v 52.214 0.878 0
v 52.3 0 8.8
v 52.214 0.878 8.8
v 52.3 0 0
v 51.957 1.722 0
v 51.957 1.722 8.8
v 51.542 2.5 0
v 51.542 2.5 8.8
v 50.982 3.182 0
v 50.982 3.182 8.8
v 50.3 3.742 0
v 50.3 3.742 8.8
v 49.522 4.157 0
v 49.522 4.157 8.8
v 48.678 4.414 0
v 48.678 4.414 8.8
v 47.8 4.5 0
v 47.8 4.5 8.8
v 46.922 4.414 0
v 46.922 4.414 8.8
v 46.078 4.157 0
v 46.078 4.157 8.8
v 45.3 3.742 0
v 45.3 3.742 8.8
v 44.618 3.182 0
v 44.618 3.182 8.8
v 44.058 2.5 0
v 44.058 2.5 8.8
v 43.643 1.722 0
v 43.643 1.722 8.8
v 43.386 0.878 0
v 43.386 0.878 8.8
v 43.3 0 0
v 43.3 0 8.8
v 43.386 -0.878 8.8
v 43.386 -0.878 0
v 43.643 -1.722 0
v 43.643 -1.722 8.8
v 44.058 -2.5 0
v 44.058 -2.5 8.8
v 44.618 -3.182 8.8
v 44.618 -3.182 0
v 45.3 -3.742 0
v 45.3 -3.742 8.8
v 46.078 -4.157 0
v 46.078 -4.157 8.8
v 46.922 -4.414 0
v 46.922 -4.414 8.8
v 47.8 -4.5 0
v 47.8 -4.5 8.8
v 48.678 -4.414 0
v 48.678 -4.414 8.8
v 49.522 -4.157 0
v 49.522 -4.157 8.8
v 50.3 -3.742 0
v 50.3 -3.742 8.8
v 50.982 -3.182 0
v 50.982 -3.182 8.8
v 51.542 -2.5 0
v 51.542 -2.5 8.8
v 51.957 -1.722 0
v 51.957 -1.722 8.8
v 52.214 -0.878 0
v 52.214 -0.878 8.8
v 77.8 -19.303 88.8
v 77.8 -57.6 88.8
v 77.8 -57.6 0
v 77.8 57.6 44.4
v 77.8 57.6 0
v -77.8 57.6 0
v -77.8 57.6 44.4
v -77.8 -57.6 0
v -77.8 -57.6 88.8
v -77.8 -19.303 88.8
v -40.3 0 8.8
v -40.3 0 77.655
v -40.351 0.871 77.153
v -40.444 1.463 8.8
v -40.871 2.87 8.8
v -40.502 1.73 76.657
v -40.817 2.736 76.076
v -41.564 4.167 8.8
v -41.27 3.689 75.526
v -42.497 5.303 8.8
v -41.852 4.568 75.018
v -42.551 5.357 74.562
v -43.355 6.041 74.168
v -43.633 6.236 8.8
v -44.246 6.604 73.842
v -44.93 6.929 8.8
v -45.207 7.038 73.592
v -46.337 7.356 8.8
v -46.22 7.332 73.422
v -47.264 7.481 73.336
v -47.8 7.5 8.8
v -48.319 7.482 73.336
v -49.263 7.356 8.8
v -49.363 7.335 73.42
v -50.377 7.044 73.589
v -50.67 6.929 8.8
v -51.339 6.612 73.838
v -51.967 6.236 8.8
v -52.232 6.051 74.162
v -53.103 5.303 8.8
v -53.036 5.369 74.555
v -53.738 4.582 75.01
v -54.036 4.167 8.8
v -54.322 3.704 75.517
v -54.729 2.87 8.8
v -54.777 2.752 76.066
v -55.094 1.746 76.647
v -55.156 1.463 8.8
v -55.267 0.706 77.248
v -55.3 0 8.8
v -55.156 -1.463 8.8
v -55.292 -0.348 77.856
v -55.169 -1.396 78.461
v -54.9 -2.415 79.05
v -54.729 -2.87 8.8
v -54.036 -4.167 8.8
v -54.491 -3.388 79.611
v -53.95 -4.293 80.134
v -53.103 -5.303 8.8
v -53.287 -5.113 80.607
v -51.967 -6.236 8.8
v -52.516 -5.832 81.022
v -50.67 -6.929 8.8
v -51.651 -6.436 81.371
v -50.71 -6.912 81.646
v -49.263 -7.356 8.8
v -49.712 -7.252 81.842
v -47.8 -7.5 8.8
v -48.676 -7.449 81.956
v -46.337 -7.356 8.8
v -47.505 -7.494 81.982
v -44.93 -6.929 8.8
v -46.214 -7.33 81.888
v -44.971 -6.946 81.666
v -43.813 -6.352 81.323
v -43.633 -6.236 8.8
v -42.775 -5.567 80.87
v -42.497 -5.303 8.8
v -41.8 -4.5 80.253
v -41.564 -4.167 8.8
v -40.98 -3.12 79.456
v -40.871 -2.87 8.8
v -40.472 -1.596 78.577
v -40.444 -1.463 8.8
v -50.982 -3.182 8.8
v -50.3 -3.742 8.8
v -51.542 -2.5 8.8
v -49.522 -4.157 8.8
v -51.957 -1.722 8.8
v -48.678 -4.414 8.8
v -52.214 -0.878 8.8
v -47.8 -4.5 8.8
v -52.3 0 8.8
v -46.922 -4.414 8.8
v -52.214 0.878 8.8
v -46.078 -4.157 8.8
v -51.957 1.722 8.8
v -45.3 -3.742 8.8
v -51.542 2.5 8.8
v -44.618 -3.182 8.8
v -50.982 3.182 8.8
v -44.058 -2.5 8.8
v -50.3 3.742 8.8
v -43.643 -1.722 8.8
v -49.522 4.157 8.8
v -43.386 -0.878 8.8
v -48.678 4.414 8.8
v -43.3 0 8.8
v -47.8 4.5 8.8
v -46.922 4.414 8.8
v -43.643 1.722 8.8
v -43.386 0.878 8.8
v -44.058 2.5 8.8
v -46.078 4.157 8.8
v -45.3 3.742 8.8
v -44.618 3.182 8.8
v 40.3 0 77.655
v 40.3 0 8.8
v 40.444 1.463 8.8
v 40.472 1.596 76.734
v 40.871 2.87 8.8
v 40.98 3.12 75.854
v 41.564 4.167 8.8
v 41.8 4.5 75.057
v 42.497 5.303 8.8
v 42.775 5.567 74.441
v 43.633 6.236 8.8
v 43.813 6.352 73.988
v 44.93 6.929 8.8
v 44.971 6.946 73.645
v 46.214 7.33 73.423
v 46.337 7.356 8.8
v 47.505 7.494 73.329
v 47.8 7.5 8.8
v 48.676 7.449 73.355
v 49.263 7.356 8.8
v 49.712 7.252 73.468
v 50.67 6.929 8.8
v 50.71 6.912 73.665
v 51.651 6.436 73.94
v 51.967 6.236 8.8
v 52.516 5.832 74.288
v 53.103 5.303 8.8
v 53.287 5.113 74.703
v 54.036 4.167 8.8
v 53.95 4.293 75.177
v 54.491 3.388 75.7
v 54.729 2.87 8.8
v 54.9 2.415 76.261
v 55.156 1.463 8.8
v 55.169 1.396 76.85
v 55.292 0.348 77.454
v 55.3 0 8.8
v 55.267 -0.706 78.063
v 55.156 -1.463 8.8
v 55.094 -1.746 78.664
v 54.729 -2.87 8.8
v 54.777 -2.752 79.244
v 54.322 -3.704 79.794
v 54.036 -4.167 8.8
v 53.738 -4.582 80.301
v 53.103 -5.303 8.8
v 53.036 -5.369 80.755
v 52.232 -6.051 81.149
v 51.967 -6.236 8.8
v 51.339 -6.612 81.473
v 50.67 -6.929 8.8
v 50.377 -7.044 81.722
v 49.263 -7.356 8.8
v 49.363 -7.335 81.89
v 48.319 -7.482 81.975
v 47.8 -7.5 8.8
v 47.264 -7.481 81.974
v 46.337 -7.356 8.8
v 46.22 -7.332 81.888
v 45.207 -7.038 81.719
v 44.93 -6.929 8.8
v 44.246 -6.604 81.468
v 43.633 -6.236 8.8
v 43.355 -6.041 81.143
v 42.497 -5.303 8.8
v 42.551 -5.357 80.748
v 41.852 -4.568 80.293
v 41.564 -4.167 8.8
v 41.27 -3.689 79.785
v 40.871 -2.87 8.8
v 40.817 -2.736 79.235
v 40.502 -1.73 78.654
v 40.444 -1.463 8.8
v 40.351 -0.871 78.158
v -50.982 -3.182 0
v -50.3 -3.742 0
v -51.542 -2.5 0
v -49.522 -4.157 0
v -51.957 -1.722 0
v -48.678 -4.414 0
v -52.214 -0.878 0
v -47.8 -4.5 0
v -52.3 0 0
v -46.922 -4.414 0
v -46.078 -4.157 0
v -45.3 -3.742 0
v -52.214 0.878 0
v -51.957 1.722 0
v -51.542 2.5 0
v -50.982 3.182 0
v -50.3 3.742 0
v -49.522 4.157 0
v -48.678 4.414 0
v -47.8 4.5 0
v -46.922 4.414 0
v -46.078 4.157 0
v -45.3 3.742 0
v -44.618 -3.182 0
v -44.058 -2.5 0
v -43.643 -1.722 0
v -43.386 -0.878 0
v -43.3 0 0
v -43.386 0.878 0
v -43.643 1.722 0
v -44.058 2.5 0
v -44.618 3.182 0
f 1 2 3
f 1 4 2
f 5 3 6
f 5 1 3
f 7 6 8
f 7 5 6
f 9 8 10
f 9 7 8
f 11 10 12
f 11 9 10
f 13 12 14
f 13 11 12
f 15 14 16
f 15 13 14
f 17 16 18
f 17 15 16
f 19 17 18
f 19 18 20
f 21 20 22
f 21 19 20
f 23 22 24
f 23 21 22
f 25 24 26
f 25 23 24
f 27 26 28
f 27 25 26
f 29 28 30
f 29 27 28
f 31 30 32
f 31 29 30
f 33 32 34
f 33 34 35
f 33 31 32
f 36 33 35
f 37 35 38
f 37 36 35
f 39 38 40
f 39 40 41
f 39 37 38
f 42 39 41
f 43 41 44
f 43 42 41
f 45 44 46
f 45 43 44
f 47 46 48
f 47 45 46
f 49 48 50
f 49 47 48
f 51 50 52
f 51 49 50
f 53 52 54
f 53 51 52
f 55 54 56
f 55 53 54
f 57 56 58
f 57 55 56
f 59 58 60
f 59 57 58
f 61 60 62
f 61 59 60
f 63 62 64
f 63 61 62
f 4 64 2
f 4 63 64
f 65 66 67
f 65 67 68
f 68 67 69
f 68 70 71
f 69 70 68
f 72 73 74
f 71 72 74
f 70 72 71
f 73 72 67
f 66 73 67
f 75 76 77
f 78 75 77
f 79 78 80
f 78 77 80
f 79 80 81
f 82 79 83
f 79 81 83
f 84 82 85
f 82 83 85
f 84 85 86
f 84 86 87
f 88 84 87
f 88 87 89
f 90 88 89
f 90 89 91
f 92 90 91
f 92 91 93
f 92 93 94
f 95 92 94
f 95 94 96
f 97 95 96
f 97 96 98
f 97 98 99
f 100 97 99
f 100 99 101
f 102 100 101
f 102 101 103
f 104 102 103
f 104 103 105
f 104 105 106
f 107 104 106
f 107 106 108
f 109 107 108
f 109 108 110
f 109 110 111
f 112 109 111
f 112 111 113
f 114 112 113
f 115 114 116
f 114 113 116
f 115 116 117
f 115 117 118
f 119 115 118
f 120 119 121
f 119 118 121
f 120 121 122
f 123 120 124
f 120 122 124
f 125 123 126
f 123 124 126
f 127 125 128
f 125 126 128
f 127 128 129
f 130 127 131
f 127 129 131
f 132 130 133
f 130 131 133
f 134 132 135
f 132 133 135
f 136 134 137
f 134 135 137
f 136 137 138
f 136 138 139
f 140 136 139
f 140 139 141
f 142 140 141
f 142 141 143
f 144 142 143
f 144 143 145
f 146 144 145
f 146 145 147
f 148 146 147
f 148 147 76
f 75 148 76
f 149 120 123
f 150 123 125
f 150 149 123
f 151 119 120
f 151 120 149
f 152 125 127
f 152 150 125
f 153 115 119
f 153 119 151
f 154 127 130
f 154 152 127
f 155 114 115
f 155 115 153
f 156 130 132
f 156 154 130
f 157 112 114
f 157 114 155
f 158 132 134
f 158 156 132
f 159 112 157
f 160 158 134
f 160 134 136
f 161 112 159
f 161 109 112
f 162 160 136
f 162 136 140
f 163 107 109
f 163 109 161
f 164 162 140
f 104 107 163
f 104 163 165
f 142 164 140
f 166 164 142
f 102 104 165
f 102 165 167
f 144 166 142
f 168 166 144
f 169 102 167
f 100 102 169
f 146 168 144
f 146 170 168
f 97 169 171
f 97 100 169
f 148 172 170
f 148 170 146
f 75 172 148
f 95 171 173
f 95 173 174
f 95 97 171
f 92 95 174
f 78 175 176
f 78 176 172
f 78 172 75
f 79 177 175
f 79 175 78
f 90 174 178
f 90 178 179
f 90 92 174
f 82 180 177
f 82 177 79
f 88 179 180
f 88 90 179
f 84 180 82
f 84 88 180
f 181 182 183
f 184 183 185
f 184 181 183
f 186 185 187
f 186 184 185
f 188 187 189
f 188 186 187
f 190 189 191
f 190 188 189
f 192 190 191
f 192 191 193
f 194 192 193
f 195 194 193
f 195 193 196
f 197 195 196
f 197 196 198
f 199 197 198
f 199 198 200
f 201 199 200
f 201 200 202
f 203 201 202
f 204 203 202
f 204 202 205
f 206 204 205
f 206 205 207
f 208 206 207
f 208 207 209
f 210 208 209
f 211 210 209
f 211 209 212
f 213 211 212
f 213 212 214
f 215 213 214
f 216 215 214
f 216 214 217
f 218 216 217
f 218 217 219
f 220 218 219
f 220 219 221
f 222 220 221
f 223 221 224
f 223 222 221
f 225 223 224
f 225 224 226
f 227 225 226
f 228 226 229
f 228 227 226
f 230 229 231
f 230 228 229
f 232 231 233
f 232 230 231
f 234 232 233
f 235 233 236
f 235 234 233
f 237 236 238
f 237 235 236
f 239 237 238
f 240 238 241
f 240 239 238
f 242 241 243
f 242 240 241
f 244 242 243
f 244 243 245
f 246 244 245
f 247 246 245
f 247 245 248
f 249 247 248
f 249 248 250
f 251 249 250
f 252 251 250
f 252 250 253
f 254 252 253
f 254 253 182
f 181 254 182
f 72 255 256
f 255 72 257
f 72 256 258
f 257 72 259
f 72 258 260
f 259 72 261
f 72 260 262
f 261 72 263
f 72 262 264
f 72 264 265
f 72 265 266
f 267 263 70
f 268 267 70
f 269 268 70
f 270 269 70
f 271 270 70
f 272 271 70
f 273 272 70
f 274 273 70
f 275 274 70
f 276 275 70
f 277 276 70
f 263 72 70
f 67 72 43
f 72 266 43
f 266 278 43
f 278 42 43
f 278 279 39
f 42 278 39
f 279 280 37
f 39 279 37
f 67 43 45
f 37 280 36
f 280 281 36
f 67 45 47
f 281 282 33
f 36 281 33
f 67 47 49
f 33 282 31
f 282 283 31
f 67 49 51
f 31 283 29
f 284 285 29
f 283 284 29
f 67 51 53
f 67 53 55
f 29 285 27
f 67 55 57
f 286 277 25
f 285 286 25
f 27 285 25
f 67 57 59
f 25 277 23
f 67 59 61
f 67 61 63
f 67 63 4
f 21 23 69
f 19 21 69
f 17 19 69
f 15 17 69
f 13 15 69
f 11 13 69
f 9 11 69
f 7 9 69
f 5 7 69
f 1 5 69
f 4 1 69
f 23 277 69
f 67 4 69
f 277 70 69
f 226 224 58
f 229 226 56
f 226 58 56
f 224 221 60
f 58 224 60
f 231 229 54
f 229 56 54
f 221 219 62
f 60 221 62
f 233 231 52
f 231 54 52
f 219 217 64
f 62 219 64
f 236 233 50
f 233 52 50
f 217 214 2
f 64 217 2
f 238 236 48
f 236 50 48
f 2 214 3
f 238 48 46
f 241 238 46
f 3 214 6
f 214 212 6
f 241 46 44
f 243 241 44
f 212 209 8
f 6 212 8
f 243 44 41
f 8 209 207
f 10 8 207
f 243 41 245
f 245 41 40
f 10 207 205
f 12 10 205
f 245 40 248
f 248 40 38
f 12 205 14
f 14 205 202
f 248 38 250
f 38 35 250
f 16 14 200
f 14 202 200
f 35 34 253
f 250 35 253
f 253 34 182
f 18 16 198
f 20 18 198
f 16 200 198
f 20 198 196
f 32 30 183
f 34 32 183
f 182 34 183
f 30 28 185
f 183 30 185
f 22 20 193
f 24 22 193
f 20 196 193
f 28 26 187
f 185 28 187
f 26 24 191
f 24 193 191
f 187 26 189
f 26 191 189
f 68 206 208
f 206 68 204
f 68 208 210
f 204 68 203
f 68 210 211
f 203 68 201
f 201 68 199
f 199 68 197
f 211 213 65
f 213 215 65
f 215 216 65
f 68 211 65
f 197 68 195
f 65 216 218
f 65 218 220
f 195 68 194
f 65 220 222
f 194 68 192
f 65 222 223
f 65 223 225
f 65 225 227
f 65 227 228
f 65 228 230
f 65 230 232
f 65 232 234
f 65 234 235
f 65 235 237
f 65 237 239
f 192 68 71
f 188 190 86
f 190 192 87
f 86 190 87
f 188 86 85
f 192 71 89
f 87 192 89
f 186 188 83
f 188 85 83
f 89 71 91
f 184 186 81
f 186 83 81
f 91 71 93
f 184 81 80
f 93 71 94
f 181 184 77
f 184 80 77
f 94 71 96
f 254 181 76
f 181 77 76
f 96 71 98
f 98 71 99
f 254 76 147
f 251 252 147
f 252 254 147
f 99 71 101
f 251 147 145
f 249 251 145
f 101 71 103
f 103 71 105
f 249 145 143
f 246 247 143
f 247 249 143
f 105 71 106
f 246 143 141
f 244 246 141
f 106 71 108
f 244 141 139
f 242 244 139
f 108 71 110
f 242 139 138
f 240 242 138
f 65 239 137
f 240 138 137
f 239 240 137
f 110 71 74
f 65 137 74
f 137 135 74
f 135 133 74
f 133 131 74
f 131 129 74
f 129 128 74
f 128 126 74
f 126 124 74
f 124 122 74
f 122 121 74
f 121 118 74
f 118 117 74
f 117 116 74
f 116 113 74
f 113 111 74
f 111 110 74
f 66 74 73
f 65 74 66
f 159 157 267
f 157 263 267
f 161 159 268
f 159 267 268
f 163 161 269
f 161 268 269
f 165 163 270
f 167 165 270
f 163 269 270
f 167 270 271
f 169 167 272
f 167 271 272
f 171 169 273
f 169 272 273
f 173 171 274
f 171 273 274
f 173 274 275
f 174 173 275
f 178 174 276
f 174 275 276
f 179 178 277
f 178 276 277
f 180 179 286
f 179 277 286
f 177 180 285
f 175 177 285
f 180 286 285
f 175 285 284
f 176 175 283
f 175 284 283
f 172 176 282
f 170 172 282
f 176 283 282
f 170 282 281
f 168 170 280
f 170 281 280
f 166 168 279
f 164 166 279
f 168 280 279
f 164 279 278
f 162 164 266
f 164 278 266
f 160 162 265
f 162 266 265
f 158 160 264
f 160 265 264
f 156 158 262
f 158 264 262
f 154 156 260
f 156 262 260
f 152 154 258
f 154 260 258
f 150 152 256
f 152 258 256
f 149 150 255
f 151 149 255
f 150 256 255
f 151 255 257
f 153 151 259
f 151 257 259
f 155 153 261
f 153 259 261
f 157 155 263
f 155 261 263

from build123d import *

# Parameters (mm, degrees)
SKIZZE1_W                                           = 155.6
SKIZZE1_H                                           = 115.2
AUFSATZ_LINEAR_AUSTRAGEN1_DEPTH                     = 88.8
STIRNSENKUNG_F_R_M8_SENKSCHRAUBE_KOPF_B_D           = 9
STIRNSENKUNG_F_R_M8_SENKSCHRAUBE_KOPF_B_CBORE_D     = 15
STIRNSENKUNG_F_R_M8_SENKSCHRAUBE_KOPF_B_CBORE_DEPTH = 80
SCHNITT_LINEAR_AUSTRAGEN1_DEPTH                     = 189.187566008


with BuildPart() as part:
    # Skizze1 → Aufsatz-Linear austragen1 (new body)
    with BuildSketch(Plane.XY):
        Rectangle(SKIZZE1_W, SKIZZE1_H)
    extrude(amount=AUFSATZ_LINEAR_AUSTRAGEN1_DEPTH)

    # Stirnsenkung für M8 Senkschraube (Kopf Button)1 (through all)
    with Locations(Plane.XY.offset(88.8)):
        with Locations((-47.8, 0)):
            stirnsenkung_f_r_m8_senkschraube_kopf_b = CounterBoreHole(STIRNSENKUNG_F_R_M8_SENKSCHRAUBE_KOPF_B_D / 2, STIRNSENKUNG_F_R_M8_SENKSCHRAUBE_KOPF_B_CBORE_D / 2, STIRNSENKUNG_F_R_M8_SENKSCHRAUBE_KOPF_B_CBORE_DEPTH)

    # Spiegeln1: Stirnsenkung für M8 Senkschraube (Kopf Button)1 across plane
    add(stirnsenkung_f_r_m8_senkschraube_kopf_b.mirror(Plane(origin=(0, 0, 0), x_dir=(0, 0, 1), z_dir=(1, 0, 0))), mode=Mode.SUBTRACT)

    # Skizze6 → Schnitt-Linear austragen1 (cut, through all)
    with BuildSketch(Plane.ZY.offset(77.8)):
        Polygon((44.4, 57.6), (88.8, -19.303055856), (88.8, 57.6), align=None)
    extrude(amount=-SCHNITT_LINEAR_AUSTRAGEN1_DEPTH, mode=Mode.SUBTRACT)


solid = part.part
